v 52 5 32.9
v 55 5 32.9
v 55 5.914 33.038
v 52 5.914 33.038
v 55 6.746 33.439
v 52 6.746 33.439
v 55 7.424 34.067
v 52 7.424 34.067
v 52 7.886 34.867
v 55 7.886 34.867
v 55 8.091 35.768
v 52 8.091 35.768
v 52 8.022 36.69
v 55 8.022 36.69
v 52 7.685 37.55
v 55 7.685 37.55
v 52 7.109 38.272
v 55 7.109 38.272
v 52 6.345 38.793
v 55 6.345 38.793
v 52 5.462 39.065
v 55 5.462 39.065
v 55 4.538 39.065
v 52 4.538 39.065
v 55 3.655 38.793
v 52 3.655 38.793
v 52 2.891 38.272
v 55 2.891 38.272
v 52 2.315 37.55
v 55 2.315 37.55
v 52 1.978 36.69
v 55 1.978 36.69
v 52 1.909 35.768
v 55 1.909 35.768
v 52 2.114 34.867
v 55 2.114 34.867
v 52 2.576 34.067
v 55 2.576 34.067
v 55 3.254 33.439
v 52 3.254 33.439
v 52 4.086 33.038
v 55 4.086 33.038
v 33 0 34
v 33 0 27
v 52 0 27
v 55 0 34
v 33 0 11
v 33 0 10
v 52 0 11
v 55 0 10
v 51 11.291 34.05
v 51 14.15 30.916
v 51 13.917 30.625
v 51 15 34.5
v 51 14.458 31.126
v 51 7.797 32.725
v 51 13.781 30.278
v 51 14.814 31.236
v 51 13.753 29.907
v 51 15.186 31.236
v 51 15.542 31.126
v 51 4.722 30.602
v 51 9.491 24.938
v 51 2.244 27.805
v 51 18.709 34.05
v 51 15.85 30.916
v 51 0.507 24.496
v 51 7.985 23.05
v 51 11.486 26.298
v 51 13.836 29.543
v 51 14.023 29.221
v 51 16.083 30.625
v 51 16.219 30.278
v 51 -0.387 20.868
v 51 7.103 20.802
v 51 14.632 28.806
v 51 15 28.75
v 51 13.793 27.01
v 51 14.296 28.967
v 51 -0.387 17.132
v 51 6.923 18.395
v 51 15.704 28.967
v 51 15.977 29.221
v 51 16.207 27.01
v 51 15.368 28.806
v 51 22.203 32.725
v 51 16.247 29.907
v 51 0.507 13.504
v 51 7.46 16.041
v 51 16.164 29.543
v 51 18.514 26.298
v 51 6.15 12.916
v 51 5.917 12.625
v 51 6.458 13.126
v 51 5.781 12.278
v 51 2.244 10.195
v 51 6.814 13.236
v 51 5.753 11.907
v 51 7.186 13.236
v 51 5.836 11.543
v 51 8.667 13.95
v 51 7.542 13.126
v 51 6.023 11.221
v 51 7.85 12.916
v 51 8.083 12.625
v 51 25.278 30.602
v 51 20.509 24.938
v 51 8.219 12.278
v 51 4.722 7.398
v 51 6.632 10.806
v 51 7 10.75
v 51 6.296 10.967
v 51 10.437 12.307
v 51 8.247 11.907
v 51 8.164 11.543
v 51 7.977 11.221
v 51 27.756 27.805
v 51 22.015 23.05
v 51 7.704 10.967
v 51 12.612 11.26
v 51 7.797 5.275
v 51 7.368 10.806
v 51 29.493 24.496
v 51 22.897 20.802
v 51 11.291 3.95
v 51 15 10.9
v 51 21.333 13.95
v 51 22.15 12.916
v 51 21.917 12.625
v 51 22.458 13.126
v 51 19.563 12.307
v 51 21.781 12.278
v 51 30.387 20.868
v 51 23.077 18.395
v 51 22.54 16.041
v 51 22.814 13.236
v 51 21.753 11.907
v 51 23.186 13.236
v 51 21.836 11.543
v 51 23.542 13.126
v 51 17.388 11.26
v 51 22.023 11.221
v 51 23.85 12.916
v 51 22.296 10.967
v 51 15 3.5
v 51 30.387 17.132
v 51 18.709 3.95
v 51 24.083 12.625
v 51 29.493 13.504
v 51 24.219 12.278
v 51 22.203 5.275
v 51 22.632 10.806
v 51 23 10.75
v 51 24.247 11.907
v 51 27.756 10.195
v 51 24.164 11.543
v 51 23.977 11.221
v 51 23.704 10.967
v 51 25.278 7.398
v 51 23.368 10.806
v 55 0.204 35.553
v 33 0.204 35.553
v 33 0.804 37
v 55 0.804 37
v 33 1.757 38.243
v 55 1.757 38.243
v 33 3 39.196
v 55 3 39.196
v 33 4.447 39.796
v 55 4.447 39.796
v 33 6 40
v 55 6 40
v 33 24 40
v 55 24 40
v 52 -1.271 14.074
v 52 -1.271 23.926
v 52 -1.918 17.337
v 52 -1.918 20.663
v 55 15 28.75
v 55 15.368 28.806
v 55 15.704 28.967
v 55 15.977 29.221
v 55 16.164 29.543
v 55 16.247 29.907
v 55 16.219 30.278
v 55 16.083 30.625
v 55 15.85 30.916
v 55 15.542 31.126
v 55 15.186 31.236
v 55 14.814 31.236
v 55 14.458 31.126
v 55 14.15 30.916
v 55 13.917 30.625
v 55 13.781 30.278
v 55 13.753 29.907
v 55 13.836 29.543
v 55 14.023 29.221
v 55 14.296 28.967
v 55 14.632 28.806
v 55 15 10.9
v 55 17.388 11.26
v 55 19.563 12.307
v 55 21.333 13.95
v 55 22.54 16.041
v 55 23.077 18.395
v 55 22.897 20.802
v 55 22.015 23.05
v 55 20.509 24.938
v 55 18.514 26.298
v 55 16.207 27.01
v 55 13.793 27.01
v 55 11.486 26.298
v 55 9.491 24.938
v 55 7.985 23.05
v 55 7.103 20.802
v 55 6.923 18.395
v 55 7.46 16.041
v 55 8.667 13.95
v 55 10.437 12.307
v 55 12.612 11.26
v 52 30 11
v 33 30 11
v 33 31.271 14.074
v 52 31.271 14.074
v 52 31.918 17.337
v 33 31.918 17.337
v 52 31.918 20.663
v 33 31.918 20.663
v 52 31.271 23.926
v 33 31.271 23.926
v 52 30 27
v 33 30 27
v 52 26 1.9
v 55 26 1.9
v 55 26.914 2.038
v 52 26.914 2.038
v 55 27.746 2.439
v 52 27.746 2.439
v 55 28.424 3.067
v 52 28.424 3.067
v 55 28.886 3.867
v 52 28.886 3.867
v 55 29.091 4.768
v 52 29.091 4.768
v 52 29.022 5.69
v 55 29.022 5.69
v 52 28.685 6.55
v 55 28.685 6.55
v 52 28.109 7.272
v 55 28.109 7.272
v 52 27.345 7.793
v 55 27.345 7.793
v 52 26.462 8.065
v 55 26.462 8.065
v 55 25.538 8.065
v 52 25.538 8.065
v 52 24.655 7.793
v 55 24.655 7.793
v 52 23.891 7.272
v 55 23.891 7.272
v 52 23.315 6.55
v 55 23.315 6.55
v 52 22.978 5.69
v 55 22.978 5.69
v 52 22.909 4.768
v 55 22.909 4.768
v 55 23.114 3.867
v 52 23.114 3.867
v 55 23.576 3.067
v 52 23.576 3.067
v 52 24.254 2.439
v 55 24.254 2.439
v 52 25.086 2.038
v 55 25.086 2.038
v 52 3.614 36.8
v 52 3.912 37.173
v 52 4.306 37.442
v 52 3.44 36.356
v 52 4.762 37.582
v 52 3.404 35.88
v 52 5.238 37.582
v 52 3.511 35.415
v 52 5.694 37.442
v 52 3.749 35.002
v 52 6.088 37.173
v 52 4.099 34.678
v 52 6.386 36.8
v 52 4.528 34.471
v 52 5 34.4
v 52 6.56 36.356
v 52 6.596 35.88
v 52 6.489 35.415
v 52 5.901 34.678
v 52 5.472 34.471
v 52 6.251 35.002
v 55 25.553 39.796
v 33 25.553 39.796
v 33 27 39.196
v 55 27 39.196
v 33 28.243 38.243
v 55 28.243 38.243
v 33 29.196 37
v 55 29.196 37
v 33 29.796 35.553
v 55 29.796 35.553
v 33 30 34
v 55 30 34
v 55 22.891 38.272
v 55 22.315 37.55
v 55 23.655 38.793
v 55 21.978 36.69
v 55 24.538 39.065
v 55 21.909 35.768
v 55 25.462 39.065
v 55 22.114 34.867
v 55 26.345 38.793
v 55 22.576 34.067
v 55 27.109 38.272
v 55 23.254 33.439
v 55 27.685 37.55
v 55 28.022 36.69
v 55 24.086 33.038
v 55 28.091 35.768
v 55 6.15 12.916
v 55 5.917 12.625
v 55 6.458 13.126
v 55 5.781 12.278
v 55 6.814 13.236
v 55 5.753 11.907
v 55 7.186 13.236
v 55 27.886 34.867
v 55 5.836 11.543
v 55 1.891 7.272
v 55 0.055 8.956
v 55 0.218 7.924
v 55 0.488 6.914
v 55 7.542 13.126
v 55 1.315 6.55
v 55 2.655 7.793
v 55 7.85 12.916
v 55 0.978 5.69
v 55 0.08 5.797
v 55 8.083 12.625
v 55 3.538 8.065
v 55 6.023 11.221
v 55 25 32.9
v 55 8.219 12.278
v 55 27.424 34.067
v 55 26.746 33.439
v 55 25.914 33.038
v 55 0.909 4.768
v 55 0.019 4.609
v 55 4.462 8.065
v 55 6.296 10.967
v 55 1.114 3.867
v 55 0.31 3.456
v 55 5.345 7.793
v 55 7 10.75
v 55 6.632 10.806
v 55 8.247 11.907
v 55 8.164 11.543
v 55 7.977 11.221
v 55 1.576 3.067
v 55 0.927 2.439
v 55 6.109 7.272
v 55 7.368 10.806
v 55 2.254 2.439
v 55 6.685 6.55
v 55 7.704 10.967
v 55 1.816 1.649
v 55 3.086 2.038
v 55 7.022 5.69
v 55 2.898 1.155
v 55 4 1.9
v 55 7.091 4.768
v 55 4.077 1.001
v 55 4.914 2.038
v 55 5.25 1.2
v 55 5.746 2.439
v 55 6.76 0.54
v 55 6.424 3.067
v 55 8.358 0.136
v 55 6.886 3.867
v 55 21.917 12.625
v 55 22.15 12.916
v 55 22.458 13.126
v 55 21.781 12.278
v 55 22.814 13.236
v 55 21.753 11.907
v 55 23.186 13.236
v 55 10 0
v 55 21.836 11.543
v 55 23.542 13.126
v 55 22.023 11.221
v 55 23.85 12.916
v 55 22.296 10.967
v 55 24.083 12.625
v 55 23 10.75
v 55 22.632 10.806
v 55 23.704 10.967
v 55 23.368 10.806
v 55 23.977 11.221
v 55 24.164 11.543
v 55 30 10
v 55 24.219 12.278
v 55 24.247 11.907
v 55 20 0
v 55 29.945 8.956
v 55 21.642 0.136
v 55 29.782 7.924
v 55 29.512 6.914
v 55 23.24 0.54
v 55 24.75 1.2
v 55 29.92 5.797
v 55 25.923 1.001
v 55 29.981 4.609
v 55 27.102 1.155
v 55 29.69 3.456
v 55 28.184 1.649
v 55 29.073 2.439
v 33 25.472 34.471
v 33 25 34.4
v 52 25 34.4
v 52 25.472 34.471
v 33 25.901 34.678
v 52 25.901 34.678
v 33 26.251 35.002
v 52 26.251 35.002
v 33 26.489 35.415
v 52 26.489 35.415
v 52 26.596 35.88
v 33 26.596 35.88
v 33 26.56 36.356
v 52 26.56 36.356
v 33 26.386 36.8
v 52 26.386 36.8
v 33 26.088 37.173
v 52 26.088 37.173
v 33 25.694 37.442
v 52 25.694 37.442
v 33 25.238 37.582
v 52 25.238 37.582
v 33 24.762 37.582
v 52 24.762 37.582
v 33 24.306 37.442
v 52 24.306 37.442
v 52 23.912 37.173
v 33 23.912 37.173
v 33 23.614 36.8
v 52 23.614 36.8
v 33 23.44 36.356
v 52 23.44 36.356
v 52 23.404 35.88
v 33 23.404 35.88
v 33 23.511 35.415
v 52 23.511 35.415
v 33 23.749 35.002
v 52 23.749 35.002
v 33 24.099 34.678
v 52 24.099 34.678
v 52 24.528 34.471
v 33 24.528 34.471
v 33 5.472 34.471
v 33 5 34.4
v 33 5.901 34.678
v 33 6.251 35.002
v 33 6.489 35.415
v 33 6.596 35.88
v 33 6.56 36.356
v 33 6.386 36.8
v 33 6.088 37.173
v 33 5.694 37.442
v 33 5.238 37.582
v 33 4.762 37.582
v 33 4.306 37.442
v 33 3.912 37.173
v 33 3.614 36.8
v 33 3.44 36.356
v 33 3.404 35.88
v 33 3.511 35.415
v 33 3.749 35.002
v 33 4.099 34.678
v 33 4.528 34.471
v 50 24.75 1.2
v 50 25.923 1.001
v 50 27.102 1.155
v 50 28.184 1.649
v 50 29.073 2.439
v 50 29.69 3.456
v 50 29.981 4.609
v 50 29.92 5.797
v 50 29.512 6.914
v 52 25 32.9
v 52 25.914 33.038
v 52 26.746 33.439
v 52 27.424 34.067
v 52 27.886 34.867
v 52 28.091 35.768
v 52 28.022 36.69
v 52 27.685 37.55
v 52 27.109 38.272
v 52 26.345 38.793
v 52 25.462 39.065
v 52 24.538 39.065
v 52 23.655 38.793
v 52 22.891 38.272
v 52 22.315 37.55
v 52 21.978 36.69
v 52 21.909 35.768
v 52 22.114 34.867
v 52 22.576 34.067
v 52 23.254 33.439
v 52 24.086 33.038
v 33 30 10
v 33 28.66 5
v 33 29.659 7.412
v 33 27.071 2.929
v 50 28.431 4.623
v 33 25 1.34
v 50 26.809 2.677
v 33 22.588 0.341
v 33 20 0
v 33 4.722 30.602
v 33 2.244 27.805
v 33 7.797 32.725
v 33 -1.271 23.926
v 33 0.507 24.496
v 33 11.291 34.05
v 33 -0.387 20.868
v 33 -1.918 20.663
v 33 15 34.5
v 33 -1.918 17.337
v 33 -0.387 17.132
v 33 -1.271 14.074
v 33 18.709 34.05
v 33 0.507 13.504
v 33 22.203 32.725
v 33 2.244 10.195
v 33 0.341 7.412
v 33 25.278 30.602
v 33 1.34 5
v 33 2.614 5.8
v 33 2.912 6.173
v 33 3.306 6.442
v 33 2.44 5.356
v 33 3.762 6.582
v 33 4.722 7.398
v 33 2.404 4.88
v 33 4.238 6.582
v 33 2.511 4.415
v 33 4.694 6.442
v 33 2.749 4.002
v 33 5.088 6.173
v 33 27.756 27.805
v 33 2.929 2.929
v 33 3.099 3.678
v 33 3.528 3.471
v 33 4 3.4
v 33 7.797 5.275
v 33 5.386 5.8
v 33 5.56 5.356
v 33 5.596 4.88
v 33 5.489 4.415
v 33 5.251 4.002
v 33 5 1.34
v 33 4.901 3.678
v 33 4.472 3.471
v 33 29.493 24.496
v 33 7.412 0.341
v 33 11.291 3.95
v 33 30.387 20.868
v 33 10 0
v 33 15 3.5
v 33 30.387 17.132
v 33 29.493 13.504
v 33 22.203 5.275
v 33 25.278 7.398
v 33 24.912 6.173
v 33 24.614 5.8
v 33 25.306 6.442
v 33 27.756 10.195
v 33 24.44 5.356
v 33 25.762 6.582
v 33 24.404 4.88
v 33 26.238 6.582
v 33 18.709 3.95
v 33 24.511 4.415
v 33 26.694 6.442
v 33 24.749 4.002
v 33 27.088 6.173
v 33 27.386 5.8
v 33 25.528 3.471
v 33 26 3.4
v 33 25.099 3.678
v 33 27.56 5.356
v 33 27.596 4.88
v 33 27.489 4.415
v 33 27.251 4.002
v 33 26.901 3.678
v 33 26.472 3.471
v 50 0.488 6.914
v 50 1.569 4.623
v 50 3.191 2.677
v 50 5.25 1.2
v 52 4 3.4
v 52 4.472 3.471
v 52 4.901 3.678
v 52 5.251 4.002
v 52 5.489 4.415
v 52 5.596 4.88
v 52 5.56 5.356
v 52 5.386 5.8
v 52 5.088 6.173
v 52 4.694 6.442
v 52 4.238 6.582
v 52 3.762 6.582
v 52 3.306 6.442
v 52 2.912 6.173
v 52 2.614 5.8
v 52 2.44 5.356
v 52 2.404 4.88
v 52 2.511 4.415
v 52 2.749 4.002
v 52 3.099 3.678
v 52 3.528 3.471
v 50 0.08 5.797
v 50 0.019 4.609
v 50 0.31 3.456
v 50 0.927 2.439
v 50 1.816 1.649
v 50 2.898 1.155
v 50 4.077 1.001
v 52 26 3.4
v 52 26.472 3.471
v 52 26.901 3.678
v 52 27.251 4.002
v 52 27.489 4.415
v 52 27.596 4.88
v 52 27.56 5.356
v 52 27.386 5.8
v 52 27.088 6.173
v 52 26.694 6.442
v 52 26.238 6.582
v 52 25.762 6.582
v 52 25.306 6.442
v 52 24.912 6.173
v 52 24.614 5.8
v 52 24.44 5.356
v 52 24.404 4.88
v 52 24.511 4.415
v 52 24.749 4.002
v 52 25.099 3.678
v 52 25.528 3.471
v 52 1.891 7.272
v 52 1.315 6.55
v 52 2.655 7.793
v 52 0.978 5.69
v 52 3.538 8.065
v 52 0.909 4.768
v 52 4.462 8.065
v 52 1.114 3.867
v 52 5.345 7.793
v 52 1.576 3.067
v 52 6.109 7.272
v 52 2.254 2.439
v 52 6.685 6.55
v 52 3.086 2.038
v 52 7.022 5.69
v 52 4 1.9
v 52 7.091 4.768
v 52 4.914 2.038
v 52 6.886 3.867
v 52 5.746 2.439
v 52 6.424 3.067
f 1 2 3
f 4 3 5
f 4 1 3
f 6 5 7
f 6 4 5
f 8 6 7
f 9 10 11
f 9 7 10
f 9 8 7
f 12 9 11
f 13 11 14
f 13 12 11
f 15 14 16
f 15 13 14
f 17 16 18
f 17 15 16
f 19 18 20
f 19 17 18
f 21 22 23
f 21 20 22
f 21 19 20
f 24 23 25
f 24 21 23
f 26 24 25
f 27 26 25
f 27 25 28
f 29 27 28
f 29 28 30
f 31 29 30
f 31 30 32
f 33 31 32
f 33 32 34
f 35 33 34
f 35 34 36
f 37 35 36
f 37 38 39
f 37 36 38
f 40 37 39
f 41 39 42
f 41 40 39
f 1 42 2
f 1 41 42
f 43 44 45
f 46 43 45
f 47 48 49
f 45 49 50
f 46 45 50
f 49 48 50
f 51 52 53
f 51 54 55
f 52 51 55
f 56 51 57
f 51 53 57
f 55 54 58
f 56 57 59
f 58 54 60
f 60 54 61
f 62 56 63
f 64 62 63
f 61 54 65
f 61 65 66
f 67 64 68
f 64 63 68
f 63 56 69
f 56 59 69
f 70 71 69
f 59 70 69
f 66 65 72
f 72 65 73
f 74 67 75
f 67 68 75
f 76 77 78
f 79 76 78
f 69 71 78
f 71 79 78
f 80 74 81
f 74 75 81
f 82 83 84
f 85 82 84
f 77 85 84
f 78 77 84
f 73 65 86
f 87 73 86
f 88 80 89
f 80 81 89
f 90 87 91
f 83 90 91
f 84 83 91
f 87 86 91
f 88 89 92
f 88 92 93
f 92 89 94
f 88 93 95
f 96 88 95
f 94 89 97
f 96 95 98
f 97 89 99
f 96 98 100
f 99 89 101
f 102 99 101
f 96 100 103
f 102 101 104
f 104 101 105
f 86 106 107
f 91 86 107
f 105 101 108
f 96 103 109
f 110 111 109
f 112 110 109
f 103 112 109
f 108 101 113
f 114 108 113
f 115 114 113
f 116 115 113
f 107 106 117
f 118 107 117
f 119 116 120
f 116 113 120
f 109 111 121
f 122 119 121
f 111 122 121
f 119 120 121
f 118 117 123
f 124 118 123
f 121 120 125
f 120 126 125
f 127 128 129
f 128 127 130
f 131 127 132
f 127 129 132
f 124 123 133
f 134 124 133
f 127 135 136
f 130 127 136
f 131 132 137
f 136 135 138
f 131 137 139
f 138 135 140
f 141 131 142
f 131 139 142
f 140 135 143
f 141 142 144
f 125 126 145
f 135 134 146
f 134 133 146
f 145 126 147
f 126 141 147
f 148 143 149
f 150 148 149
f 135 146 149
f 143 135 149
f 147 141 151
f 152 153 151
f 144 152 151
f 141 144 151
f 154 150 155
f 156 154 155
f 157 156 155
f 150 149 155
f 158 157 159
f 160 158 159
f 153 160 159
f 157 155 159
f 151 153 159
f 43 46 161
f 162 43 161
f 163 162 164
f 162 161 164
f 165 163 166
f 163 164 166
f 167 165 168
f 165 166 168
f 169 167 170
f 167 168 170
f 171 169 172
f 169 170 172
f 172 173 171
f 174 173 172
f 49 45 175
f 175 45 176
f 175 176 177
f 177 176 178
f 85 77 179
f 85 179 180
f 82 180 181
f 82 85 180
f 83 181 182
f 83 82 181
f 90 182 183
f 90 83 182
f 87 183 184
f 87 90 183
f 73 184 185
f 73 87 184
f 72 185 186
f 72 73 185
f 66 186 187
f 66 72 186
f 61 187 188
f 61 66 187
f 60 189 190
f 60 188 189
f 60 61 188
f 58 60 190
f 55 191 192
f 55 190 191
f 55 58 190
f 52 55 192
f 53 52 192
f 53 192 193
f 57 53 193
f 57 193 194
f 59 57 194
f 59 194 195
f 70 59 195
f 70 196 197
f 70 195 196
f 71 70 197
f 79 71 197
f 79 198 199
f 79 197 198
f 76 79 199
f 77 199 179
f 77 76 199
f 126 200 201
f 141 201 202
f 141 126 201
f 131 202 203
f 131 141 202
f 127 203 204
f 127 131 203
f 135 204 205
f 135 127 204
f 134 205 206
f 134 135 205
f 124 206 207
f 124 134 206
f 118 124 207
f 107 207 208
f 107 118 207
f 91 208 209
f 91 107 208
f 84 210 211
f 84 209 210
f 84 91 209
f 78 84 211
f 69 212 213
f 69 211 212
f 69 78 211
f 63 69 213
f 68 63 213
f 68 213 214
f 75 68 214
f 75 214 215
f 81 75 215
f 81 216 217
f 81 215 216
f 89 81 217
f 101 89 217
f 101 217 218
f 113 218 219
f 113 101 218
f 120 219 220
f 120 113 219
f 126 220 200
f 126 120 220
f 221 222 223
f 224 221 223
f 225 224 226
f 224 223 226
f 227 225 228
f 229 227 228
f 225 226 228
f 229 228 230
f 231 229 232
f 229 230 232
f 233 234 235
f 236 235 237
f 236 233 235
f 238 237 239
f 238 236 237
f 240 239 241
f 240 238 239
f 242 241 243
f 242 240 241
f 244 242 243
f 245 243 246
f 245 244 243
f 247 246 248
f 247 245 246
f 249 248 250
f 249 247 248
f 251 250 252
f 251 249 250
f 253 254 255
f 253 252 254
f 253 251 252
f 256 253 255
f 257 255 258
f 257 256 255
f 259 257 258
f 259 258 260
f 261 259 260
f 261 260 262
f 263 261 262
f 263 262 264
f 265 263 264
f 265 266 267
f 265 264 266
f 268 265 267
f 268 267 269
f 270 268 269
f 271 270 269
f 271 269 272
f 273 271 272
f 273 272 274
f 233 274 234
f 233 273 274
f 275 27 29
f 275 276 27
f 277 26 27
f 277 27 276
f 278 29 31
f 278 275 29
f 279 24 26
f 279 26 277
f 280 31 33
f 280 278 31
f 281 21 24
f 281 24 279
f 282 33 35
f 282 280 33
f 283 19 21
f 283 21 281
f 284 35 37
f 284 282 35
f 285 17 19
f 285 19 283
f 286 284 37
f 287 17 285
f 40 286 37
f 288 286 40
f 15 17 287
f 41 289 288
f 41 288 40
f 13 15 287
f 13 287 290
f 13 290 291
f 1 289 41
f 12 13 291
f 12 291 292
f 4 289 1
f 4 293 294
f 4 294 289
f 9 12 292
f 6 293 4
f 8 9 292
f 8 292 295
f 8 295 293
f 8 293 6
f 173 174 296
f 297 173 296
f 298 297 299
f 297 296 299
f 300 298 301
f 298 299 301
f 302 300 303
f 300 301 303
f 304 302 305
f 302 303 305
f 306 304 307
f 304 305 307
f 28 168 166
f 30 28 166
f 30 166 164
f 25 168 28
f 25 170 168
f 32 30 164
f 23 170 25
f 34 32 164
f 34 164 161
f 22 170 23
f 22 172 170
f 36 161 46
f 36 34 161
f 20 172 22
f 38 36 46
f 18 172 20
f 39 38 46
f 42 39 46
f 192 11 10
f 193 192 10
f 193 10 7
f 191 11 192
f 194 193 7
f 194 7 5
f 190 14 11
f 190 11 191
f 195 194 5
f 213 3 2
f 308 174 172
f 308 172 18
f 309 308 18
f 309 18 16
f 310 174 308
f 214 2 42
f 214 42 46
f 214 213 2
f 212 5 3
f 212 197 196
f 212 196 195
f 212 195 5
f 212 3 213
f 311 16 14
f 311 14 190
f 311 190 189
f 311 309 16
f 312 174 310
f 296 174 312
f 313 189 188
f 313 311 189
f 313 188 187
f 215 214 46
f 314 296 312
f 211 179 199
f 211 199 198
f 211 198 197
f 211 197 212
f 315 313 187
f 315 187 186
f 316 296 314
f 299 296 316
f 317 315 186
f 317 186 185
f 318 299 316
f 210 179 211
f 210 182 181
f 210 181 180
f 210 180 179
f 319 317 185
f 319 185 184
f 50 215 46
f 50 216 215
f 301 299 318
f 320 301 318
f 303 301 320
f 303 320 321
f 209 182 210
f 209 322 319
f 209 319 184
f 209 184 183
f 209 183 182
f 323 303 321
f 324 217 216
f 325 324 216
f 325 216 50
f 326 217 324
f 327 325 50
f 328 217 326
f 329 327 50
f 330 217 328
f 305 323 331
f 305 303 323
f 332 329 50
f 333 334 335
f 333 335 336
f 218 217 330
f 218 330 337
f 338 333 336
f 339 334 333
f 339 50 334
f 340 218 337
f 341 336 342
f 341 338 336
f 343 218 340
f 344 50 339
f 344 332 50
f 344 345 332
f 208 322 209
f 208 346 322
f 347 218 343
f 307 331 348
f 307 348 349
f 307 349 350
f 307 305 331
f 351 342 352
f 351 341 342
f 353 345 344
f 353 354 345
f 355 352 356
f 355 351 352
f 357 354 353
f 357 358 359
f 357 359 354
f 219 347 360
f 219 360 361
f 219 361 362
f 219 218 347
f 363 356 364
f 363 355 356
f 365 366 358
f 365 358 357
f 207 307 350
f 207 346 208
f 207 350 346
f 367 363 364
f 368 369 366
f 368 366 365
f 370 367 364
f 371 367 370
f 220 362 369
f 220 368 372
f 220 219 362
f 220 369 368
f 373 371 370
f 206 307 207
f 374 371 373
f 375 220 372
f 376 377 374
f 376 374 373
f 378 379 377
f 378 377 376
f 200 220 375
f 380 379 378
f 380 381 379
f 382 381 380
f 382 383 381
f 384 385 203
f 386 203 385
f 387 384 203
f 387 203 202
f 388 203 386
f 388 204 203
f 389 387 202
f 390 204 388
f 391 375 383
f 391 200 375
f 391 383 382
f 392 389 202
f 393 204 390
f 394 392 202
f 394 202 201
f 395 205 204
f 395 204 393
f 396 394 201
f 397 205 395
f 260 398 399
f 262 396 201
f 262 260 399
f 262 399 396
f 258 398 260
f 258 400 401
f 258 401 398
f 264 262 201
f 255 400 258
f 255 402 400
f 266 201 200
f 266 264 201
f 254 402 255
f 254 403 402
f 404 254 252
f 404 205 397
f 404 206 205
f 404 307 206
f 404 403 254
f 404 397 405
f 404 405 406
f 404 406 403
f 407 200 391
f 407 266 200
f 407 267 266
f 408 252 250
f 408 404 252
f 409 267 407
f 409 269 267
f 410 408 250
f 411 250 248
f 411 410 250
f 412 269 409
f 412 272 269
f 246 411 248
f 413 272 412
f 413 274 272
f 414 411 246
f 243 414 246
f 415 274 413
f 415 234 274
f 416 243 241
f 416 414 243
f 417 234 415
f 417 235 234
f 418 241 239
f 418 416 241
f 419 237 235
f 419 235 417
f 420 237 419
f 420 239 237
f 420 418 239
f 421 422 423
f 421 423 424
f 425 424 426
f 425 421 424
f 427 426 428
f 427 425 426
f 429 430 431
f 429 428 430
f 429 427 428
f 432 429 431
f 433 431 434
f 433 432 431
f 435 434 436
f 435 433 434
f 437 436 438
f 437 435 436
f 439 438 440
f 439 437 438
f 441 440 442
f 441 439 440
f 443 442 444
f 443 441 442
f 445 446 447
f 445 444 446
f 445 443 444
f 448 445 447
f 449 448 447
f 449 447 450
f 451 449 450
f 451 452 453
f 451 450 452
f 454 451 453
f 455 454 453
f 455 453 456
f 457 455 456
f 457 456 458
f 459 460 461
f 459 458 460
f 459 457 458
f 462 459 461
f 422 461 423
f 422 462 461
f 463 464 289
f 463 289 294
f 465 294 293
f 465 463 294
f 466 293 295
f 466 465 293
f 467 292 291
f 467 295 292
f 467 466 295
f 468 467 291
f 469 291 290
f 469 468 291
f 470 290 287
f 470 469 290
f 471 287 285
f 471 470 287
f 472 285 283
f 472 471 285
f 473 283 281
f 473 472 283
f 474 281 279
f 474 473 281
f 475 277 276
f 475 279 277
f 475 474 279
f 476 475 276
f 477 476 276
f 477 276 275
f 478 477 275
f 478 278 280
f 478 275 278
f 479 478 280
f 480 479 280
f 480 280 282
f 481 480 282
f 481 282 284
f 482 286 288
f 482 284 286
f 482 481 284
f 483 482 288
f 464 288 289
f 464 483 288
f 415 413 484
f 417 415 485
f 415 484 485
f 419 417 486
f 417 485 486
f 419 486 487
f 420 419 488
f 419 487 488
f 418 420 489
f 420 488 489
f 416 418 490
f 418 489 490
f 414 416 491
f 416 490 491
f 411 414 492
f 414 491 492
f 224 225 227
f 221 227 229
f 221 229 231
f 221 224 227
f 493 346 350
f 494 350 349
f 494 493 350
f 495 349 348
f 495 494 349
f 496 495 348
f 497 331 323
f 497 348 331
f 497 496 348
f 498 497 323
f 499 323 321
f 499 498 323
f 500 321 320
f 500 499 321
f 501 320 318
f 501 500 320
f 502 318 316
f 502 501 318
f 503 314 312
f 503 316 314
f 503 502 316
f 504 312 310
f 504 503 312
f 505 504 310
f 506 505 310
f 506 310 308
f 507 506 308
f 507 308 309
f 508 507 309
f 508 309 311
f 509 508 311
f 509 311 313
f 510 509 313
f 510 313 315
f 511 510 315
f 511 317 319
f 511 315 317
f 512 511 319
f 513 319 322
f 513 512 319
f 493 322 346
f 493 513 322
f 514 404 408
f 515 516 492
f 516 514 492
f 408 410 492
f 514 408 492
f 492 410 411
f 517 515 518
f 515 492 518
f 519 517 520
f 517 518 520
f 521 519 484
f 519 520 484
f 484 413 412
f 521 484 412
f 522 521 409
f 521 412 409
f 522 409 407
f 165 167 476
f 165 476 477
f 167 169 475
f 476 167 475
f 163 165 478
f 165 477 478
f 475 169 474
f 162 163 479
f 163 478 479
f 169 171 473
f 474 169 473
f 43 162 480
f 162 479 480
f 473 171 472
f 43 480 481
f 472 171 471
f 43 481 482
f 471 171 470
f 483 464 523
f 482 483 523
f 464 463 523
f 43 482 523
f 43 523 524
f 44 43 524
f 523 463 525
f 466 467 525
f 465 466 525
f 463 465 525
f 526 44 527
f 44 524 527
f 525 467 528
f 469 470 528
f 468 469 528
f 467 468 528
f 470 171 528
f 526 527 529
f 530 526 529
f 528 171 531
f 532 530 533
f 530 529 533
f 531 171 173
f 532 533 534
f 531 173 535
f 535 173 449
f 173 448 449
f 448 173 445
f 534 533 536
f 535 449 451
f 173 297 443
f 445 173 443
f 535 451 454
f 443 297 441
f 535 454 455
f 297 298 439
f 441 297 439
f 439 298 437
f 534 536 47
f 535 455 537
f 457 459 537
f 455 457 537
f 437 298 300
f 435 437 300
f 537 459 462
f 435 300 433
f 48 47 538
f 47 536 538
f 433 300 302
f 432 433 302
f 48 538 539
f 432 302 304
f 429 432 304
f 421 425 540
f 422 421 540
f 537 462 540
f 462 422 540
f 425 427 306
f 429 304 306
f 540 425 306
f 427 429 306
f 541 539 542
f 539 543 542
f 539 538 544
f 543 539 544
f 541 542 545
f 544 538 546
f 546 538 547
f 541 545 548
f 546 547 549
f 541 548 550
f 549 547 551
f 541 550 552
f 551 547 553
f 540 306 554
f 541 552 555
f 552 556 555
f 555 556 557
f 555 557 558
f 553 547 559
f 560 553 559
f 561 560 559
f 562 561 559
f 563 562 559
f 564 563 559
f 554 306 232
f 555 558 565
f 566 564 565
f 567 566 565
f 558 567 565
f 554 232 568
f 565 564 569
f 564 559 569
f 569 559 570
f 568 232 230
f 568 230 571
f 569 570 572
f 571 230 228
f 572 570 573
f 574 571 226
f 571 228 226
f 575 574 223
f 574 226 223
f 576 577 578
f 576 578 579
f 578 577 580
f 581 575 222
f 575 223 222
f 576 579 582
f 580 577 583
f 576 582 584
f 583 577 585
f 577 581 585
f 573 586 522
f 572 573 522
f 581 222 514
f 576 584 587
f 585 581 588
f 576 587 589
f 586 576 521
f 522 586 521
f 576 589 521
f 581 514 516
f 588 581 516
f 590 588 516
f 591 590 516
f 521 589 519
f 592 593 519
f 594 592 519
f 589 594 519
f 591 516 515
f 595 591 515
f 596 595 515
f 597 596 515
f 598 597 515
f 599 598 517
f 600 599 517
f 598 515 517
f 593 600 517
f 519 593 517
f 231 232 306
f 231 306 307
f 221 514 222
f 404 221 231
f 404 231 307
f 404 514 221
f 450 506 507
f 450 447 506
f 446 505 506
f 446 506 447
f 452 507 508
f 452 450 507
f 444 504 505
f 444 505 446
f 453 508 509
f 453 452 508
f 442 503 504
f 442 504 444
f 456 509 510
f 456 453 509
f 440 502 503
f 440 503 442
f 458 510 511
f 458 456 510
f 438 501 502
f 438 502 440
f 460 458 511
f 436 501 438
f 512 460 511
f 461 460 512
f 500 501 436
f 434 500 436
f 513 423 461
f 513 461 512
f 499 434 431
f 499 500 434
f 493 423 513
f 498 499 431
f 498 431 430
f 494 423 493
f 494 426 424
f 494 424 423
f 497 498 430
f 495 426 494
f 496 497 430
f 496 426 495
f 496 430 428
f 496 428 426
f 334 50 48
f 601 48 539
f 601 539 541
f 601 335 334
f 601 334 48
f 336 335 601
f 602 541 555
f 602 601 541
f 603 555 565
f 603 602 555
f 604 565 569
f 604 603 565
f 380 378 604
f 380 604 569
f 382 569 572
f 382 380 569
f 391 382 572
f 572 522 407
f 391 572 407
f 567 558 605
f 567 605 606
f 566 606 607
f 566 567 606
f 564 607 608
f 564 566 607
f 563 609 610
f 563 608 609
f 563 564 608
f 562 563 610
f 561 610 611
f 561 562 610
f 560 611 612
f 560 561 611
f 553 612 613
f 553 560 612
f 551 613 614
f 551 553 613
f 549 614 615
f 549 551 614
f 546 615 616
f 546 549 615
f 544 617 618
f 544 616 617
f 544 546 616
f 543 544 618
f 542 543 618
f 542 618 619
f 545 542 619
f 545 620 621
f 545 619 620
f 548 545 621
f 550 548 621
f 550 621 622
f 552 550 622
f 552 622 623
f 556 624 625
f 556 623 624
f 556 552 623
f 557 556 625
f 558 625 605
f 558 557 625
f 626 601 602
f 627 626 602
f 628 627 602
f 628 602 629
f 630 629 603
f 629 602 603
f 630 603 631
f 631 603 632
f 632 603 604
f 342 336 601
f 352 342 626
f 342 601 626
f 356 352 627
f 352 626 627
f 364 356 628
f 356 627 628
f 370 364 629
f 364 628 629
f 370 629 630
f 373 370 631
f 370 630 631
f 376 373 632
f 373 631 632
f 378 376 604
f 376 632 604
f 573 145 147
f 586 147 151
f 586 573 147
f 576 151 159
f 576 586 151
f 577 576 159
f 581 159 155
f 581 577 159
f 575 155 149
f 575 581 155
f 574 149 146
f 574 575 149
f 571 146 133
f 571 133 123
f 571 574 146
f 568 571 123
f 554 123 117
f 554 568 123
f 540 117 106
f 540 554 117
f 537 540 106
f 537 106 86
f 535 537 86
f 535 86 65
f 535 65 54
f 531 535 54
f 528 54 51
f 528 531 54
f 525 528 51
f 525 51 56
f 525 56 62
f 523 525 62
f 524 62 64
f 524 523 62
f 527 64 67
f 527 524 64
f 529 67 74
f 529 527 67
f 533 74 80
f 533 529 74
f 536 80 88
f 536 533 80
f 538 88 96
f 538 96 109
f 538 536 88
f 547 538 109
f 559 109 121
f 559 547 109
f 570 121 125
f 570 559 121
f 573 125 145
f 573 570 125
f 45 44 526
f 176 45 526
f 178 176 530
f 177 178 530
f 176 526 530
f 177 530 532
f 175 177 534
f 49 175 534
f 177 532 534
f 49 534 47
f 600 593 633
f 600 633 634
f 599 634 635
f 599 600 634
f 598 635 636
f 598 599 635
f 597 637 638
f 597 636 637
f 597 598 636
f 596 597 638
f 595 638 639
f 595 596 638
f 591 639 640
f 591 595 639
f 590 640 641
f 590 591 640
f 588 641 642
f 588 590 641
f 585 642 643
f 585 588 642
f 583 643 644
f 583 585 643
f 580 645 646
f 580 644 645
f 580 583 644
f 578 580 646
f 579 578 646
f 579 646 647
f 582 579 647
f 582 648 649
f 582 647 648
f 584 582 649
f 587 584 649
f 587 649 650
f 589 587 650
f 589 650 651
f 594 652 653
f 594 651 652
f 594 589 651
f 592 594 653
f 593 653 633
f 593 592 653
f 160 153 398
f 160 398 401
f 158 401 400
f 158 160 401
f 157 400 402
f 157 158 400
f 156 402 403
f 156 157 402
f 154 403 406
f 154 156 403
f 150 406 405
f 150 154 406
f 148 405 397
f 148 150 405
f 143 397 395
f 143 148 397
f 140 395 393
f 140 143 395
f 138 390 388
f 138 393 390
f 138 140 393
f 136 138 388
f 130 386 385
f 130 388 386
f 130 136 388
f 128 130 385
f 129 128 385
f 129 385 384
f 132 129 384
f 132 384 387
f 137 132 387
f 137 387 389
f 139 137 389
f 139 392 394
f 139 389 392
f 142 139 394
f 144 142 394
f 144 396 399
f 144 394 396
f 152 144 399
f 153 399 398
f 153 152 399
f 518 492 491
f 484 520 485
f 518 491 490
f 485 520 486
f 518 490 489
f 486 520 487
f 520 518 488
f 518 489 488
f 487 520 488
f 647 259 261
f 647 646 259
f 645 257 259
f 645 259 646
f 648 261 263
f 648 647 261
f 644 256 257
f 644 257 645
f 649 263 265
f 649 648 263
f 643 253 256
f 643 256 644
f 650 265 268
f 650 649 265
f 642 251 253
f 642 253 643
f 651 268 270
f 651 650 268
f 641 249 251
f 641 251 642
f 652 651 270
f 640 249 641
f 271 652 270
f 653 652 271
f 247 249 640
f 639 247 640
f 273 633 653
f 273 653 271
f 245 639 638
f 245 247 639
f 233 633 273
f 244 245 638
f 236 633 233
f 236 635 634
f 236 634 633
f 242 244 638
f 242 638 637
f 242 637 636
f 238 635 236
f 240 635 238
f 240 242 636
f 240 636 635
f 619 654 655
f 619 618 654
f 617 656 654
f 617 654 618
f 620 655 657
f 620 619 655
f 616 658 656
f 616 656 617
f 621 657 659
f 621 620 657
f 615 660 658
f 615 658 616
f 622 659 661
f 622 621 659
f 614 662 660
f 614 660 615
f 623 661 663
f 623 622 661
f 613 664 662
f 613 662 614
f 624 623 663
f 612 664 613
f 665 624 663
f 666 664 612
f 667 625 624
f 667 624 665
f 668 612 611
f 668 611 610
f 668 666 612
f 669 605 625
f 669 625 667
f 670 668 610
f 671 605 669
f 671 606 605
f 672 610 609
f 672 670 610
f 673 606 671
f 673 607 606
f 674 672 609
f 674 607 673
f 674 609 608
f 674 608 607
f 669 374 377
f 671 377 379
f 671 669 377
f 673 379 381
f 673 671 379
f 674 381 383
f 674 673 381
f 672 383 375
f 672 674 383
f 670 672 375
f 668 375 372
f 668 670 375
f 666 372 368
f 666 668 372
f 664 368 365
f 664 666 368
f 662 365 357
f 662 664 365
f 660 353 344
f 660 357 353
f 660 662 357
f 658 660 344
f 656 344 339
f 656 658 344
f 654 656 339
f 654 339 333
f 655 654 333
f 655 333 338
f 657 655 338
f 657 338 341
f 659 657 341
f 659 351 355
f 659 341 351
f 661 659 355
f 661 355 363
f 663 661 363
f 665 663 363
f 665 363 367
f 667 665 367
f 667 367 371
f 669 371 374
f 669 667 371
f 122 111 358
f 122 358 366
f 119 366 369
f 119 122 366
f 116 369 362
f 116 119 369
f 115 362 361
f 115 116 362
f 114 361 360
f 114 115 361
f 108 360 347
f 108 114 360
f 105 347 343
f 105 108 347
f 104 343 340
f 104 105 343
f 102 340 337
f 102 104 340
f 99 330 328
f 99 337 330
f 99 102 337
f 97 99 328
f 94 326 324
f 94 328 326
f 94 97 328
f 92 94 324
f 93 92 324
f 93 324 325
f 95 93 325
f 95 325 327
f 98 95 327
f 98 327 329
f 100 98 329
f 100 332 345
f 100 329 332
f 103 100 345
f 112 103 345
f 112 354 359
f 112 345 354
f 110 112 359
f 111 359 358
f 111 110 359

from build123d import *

# Parameters (mm, degrees)
CYLINDER050_R           = 1.25
CYLINDER050_DEPTH       = 10
CYLINDER050_PITCH_ANGLE = 90
CYLINDER045_R           = 1.25
CYLINDER045_DEPTH       = 10
CYLINDER045_PITCH_ANGLE = 90
CYLINDER046_R           = 1.25
CYLINDER046_DEPTH       = 10
CYLINDER046_PITCH_ANGLE = 90
CYLINDER032_R           = 8.1
CYLINDER032_DEPTH       = 5
CYLINDER032_PITCH_ANGLE = 90
CYLINDER017_R           = 1.6
CYLINDER017_DEPTH       = 25
CYLINDER017_PITCH_ANGLE = 90
CYLINDER018_R           = 3.1
CYLINDER018_DEPTH       = 4
CYLINDER018_PITCH_ANGLE = 90
CYLINDER019_R           = 1.6
CYLINDER019_DEPTH       = 25
CYLINDER019_PITCH_ANGLE = 90
CYLINDER020_R           = 3.1
CYLINDER020_DEPTH       = 4
CYLINDER020_PITCH_ANGLE = 90
CYLINDER015_R           = 1.6
CYLINDER015_DEPTH       = 25
CYLINDER015_PITCH_ANGLE = 90
CYLINDER016_R           = 3.1
CYLINDER016_DEPTH       = 4
CYLINDER016_PITCH_ANGLE = 90
CYLINDER013_R           = 1.6
CYLINDER013_DEPTH       = 25
CYLINDER013_PITCH_ANGLE = 90
CYLINDER014_R           = 3.1
CYLINDER014_DEPTH       = 4
CYLINDER014_PITCH_ANGLE = 90
CYLINDER012_R           = 15.5
CYLINDER012_DEPTH       = 18
CYLINDER012_PITCH_ANGLE = 90
CYLINDER022_R           = 4
CYLINDER022_DEPTH       = 5
CYLINDER022_PITCH_ANGLE = 90
CYLINDER021_R           = 4
CYLINDER021_DEPTH       = 5
CYLINDER021_PITCH_ANGLE = 90
BOX007_W                = 33
BOX007_H                = 30
BOX007_DEPTH            = 40
CYLINDER003_R           = 17
CYLINDER003_DEPTH       = 19
CYLINDER003_PITCH_ANGLE = 90
BOX001_W                = 23
BOX001_H                = 30
BOX001_DEPTH            = 35
FILLET002_R             = 10
FILLET004_R             = 6
BOX_W                   = 32
BOX_H                   = 30
BOX_DEPTH               = 40
FILLET003_R             = 10
FILLET005_R             = 6


with BuildPart() as cylinder050:
    # Cylinder050 → Cylinder050 (new body)
    with BuildSketch(Plane.XY):
        Circle(CYLINDER050_R)
    extrude(amount=CYLINDER050_DEPTH)


with BuildPart() as cylinder050_1:
    # Cylinder050 pitch: moved
    add(cylinder050.part.rotate(Axis((0, 0, 0), (0, 1, 0)), CYLINDER050_PITCH_ANGLE))


with BuildPart() as cylinder050_2:
    # Cylinder050 placement: moved
    add(cylinder050_1.part.moved(Location((48, 15, 30))))


with BuildPart() as cylinder045:
    # Cylinder045 → Cylinder045 (new body)
    with BuildSketch(Plane.XY):
        Circle(CYLINDER045_R)
    extrude(amount=CYLINDER045_DEPTH)


with BuildPart() as cylinder045_1:
    # Cylinder045 pitch: moved
    add(cylinder045.part.rotate(Axis((0, 0, 0), (0, 1, 0)), CYLINDER045_PITCH_ANGLE))


with BuildPart() as cylinder045_2:
    # Cylinder045 placement: moved
    add(cylinder045_1.part.moved(Location((47, 7, 12))))


with BuildPart() as fusion023:
    # Cylinder046 → Cylinder046 (new body)
    with BuildSketch(Plane.XY):
        Circle(CYLINDER046_R)
    extrude(amount=CYLINDER046_DEPTH)


with BuildPart() as fusion023_1:
    # Cylinder046 pitch: moved
    add(fusion023.part.rotate(Axis((0, 0, 0), (0, 1, 0)), CYLINDER046_PITCH_ANGLE))


with BuildPart() as fusion023_2:
    # Cylinder046 placement: moved
    add(fusion023_1.part.moved(Location((46, 23, 12))))

    # Fusion023: union Cylinder045
    add(cylinder045_2.part)


with BuildPart() as cylinder032:
    # Cylinder032 → Cylinder032 (new body)
    with BuildSketch(Plane.XY):
        Circle(CYLINDER032_R)
    extrude(amount=CYLINDER032_DEPTH)


with BuildPart() as cylinder032_1:
    # Cylinder032 pitch: moved
    add(cylinder032.part.rotate(Axis((0, 0, 0), (0, 1, 0)), CYLINDER032_PITCH_ANGLE))


with BuildPart() as cylinder032_2:
    # Cylinder032 placement: moved
    add(cylinder032_1.part.moved(Location((51, 15, 19))))


with BuildPart() as cylinder017:
    # Cylinder017 → Cylinder017 (new body)
    with BuildSketch(Plane.XY):
        Circle(CYLINDER017_R)
    extrude(amount=CYLINDER017_DEPTH)


with BuildPart() as cylinder017_1:
    # Cylinder017 pitch: moved
    add(cylinder017.part.rotate(Axis((0, 0, 0), (0, 1, 0)), CYLINDER017_PITCH_ANGLE))


with BuildPart() as cylinder017_2:
    # Cylinder017 placement: moved
    add(cylinder017_1.part.moved(Location((30, 0, 19))))


with BuildPart() as fusion010:
    # Cylinder018 → Cylinder018 (new body)
    with BuildSketch(Plane.XY):
        Circle(CYLINDER018_R)
    extrude(amount=CYLINDER018_DEPTH)


with BuildPart() as fusion010_1:
    # Cylinder018 pitch: moved
    add(fusion010.part.rotate(Axis((0, 0, 0), (0, 1, 0)), CYLINDER018_PITCH_ANGLE))


with BuildPart() as fusion010_2:
    # Cylinder018 placement: moved
    add(fusion010_1.part.moved(Location((51, 0, 19))))

    # Fusion010: union Cylinder017
    add(cylinder017_2.part)


with BuildPart() as fusion010_3:
    # Fusion010 placement: moved
    add(fusion010_2.part.moved(Location((0, 25, 17))))


with BuildPart() as cylinder019:
    # Cylinder019 → Cylinder019 (new body)
    with BuildSketch(Plane.XY):
        Circle(CYLINDER019_R)
    extrude(amount=CYLINDER019_DEPTH)


with BuildPart() as cylinder019_1:
    # Cylinder019 pitch: moved
    add(cylinder019.part.rotate(Axis((0, 0, 0), (0, 1, 0)), CYLINDER019_PITCH_ANGLE))


with BuildPart() as cylinder019_2:
    # Cylinder019 placement: moved
    add(cylinder019_1.part.moved(Location((30, 0, 19))))


with BuildPart() as fusion011:
    # Cylinder020 → Cylinder020 (new body)
    with BuildSketch(Plane.XY):
        Circle(CYLINDER020_R)
    extrude(amount=CYLINDER020_DEPTH)


with BuildPart() as fusion011_1:
    # Cylinder020 pitch: moved
    add(fusion011.part.rotate(Axis((0, 0, 0), (0, 1, 0)), CYLINDER020_PITCH_ANGLE))


with BuildPart() as fusion011_2:
    # Cylinder020 placement: moved
    add(fusion011_1.part.moved(Location((51, 0, 19))))

    # Fusion011: union Cylinder019
    add(cylinder019_2.part)


with BuildPart() as fusion011_3:
    # Fusion011 placement: moved
    add(fusion011_2.part.moved(Location((0, 26, -14))))


with BuildPart() as cylinder015:
    # Cylinder015 → Cylinder015 (new body)
    with BuildSketch(Plane.XY):
        Circle(CYLINDER015_R)
    extrude(amount=CYLINDER015_DEPTH)


with BuildPart() as cylinder015_1:
    # Cylinder015 pitch: moved
    add(cylinder015.part.rotate(Axis((0, 0, 0), (0, 1, 0)), CYLINDER015_PITCH_ANGLE))


with BuildPart() as cylinder015_2:
    # Cylinder015 placement: moved
    add(cylinder015_1.part.moved(Location((30, 0, 19))))


with BuildPart() as fusion009:
    # Cylinder016 → Cylinder016 (new body)
    with BuildSketch(Plane.XY):
        Circle(CYLINDER016_R)
    extrude(amount=CYLINDER016_DEPTH)


with BuildPart() as fusion009_1:
    # Cylinder016 pitch: moved
    add(fusion009.part.rotate(Axis((0, 0, 0), (0, 1, 0)), CYLINDER016_PITCH_ANGLE))


with BuildPart() as fusion009_2:
    # Cylinder016 placement: moved
    add(fusion009_1.part.moved(Location((51, 0, 19))))

    # Fusion009: union Cylinder015
    add(cylinder015_2.part)


with BuildPart() as fusion009_3:
    # Fusion009 placement: moved
    add(fusion009_2.part.moved(Location((0, 5, 17))))


with BuildPart() as cylinder013:
    # Cylinder013 → Cylinder013 (new body)
    with BuildSketch(Plane.XY):
        Circle(CYLINDER013_R)
    extrude(amount=CYLINDER013_DEPTH)


with BuildPart() as cylinder013_1:
    # Cylinder013 pitch: moved
    add(cylinder013.part.rotate(Axis((0, 0, 0), (0, 1, 0)), CYLINDER013_PITCH_ANGLE))


with BuildPart() as cylinder013_2:
    # Cylinder013 placement: moved
    add(cylinder013_1.part.moved(Location((30, 0, 19))))


with BuildPart() as fusion013:
    # Cylinder014 → Cylinder014 (new body)
    with BuildSketch(Plane.XY):
        Circle(CYLINDER014_R)
    extrude(amount=CYLINDER014_DEPTH)


with BuildPart() as fusion013_1:
    # Cylinder014 pitch: moved
    add(fusion013.part.rotate(Axis((0, 0, 0), (0, 1, 0)), CYLINDER014_PITCH_ANGLE))


with BuildPart() as fusion013_2:
    # Cylinder014 placement: moved
    add(fusion013_1.part.moved(Location((51, 0, 19))))

    # Fusion008: union Cylinder013
    add(cylinder013_2.part)


with BuildPart() as fusion013_3:
    # Fusion008 placement: moved
    add(fusion013_2.part.moved(Location((0, 4, -14))))

    # Fusion013: union Fusion010, Fusion011, Fusion009
    add(fusion010_3.part)
    add(fusion011_3.part)
    add(fusion009_3.part)


with BuildPart() as fusion013_4:
    # Fusion013 placement: moved
    add(fusion013_3.part.moved(Location((1, 0, 0))))


with BuildPart() as cylinder012:
    # Cylinder012 → Cylinder012 (new body)
    with BuildSketch(Plane.XY):
        Circle(CYLINDER012_R)
    extrude(amount=CYLINDER012_DEPTH)


with BuildPart() as cylinder012_1:
    # Cylinder012 pitch: moved
    add(cylinder012.part.rotate(Axis((0, 0, 0), (0, 1, 0)), CYLINDER012_PITCH_ANGLE))


with BuildPart() as cylinder012_2:
    # Cylinder012 placement: moved
    add(cylinder012_1.part.moved(Location((33, 15, 19))))


with BuildPart() as cylinder022:
    # Cylinder022 → Cylinder022 (new body)
    with BuildSketch(Plane.XY):
        Circle(CYLINDER022_R)
    extrude(amount=CYLINDER022_DEPTH)


with BuildPart() as cylinder022_1:
    # Cylinder022 pitch: moved
    add(cylinder022.part.rotate(Axis((0, 0, 0), (0, 1, 0)), CYLINDER022_PITCH_ANGLE))


with BuildPart() as cylinder022_2:
    # Cylinder022 placement: moved
    add(cylinder022_1.part.moved(Location((50, 26, 5))))


with BuildPart() as cylinder021:
    # Cylinder021 → Cylinder021 (new body)
    with BuildSketch(Plane.XY):
        Circle(CYLINDER021_R)
    extrude(amount=CYLINDER021_DEPTH)


with BuildPart() as cylinder021_1:
    # Cylinder021 pitch: moved
    add(cylinder021.part.rotate(Axis((0, 0, 0), (0, 1, 0)), CYLINDER021_PITCH_ANGLE))


with BuildPart() as cylinder021_2:
    # Cylinder021 placement: moved
    add(cylinder021_1.part.moved(Location((50, 4, 5))))


with BuildPart() as box007:
    # Box007 → Box007 (new body)
    with BuildSketch(Plane.XY):
        with Locations((16.5, 15)):
            Rectangle(BOX007_W, BOX007_H)
    extrude(amount=BOX007_DEPTH)


with BuildPart() as cylinder003:
    # Cylinder003 → Cylinder003 (new body)
    with BuildSketch(Plane.XY):
        Circle(CYLINDER003_R)
    extrude(amount=CYLINDER003_DEPTH)


with BuildPart() as cylinder003_1:
    # Cylinder003 pitch: moved
    add(cylinder003.part.rotate(Axis((0, 0, 0), (0, 1, 0)), CYLINDER003_PITCH_ANGLE))


with BuildPart() as cylinder003_2:
    # Cylinder003 placement: moved
    add(cylinder003_1.part.moved(Location((33, 15, 19))))


with BuildPart() as fillet004:
    # Box001 → Box001 (new body)
    with BuildSketch(Plane.XY.offset(5)):
        with Locations((11.5, 15)):
            Rectangle(BOX001_W, BOX001_H)
    extrude(amount=BOX001_DEPTH)

    # Fillet002
    fillet002_edges = [fillet004.edges().sort_by_distance(p)[0] for p in [
        (11.5, 0, 5),
        (11.5, 30, 5),
    ]]
    fillet(fillet002_edges, radius=FILLET002_R)

    # Fillet004
    fillet004_edges = [fillet004.edges().sort_by_distance(p)[0] for p in [
        (11.5, 0, 40),
        (11.5, 30, 40),
    ]]
    fillet(fillet004_edges, radius=FILLET004_R)


with BuildPart() as rear_part:
    # Box → Box (new body)
    with BuildSketch(Plane(origin=(23, 0, 0), x_dir=(1, 0, 0), z_dir=(0, 0, 1))):
        with Locations((16, 15)):
            Rectangle(BOX_W, BOX_H)
    extrude(amount=BOX_DEPTH)

    # Fillet003
    fillet003_edges = [rear_part.edges().sort_by_distance(p)[0] for p in [
        (39, 0, 0),
        (39, 30, 0),
    ]]
    fillet(fillet003_edges, radius=FILLET003_R)

    # Fillet005
    fillet005_edges = [rear_part.edges().sort_by_distance(p)[0] for p in [
        (39, 0, 40),
        (39, 30, 40),
    ]]
    fillet(fillet005_edges, radius=FILLET005_R)

    # Fusion004: union Fillet004
    add(fillet004.part)

    # Fusion006: union Cylinder003
    add(cylinder003_2.part)

    # Cut005: cut Box007
    add(box007.part, mode=Mode.SUBTRACT)

    # Fusion014: union Cylinder022, Cylinder021
    add(cylinder022_2.part)
    add(cylinder021_2.part)

    # Cut007: cut Cylinder012
    add(cylinder012_2.part, mode=Mode.SUBTRACT)

    # Cut008: cut Fusion013
    add(fusion013_4.part, mode=Mode.SUBTRACT)

    # Cut011: cut Cylinder032
    add(cylinder032_2.part, mode=Mode.SUBTRACT)

    # Cut015: cut Fusion023
    add(fusion023_2.part, mode=Mode.SUBTRACT)

    # Cut018: cut Cylinder050
    add(cylinder050_2.part, mode=Mode.SUBTRACT)


solid = rear_part.part
